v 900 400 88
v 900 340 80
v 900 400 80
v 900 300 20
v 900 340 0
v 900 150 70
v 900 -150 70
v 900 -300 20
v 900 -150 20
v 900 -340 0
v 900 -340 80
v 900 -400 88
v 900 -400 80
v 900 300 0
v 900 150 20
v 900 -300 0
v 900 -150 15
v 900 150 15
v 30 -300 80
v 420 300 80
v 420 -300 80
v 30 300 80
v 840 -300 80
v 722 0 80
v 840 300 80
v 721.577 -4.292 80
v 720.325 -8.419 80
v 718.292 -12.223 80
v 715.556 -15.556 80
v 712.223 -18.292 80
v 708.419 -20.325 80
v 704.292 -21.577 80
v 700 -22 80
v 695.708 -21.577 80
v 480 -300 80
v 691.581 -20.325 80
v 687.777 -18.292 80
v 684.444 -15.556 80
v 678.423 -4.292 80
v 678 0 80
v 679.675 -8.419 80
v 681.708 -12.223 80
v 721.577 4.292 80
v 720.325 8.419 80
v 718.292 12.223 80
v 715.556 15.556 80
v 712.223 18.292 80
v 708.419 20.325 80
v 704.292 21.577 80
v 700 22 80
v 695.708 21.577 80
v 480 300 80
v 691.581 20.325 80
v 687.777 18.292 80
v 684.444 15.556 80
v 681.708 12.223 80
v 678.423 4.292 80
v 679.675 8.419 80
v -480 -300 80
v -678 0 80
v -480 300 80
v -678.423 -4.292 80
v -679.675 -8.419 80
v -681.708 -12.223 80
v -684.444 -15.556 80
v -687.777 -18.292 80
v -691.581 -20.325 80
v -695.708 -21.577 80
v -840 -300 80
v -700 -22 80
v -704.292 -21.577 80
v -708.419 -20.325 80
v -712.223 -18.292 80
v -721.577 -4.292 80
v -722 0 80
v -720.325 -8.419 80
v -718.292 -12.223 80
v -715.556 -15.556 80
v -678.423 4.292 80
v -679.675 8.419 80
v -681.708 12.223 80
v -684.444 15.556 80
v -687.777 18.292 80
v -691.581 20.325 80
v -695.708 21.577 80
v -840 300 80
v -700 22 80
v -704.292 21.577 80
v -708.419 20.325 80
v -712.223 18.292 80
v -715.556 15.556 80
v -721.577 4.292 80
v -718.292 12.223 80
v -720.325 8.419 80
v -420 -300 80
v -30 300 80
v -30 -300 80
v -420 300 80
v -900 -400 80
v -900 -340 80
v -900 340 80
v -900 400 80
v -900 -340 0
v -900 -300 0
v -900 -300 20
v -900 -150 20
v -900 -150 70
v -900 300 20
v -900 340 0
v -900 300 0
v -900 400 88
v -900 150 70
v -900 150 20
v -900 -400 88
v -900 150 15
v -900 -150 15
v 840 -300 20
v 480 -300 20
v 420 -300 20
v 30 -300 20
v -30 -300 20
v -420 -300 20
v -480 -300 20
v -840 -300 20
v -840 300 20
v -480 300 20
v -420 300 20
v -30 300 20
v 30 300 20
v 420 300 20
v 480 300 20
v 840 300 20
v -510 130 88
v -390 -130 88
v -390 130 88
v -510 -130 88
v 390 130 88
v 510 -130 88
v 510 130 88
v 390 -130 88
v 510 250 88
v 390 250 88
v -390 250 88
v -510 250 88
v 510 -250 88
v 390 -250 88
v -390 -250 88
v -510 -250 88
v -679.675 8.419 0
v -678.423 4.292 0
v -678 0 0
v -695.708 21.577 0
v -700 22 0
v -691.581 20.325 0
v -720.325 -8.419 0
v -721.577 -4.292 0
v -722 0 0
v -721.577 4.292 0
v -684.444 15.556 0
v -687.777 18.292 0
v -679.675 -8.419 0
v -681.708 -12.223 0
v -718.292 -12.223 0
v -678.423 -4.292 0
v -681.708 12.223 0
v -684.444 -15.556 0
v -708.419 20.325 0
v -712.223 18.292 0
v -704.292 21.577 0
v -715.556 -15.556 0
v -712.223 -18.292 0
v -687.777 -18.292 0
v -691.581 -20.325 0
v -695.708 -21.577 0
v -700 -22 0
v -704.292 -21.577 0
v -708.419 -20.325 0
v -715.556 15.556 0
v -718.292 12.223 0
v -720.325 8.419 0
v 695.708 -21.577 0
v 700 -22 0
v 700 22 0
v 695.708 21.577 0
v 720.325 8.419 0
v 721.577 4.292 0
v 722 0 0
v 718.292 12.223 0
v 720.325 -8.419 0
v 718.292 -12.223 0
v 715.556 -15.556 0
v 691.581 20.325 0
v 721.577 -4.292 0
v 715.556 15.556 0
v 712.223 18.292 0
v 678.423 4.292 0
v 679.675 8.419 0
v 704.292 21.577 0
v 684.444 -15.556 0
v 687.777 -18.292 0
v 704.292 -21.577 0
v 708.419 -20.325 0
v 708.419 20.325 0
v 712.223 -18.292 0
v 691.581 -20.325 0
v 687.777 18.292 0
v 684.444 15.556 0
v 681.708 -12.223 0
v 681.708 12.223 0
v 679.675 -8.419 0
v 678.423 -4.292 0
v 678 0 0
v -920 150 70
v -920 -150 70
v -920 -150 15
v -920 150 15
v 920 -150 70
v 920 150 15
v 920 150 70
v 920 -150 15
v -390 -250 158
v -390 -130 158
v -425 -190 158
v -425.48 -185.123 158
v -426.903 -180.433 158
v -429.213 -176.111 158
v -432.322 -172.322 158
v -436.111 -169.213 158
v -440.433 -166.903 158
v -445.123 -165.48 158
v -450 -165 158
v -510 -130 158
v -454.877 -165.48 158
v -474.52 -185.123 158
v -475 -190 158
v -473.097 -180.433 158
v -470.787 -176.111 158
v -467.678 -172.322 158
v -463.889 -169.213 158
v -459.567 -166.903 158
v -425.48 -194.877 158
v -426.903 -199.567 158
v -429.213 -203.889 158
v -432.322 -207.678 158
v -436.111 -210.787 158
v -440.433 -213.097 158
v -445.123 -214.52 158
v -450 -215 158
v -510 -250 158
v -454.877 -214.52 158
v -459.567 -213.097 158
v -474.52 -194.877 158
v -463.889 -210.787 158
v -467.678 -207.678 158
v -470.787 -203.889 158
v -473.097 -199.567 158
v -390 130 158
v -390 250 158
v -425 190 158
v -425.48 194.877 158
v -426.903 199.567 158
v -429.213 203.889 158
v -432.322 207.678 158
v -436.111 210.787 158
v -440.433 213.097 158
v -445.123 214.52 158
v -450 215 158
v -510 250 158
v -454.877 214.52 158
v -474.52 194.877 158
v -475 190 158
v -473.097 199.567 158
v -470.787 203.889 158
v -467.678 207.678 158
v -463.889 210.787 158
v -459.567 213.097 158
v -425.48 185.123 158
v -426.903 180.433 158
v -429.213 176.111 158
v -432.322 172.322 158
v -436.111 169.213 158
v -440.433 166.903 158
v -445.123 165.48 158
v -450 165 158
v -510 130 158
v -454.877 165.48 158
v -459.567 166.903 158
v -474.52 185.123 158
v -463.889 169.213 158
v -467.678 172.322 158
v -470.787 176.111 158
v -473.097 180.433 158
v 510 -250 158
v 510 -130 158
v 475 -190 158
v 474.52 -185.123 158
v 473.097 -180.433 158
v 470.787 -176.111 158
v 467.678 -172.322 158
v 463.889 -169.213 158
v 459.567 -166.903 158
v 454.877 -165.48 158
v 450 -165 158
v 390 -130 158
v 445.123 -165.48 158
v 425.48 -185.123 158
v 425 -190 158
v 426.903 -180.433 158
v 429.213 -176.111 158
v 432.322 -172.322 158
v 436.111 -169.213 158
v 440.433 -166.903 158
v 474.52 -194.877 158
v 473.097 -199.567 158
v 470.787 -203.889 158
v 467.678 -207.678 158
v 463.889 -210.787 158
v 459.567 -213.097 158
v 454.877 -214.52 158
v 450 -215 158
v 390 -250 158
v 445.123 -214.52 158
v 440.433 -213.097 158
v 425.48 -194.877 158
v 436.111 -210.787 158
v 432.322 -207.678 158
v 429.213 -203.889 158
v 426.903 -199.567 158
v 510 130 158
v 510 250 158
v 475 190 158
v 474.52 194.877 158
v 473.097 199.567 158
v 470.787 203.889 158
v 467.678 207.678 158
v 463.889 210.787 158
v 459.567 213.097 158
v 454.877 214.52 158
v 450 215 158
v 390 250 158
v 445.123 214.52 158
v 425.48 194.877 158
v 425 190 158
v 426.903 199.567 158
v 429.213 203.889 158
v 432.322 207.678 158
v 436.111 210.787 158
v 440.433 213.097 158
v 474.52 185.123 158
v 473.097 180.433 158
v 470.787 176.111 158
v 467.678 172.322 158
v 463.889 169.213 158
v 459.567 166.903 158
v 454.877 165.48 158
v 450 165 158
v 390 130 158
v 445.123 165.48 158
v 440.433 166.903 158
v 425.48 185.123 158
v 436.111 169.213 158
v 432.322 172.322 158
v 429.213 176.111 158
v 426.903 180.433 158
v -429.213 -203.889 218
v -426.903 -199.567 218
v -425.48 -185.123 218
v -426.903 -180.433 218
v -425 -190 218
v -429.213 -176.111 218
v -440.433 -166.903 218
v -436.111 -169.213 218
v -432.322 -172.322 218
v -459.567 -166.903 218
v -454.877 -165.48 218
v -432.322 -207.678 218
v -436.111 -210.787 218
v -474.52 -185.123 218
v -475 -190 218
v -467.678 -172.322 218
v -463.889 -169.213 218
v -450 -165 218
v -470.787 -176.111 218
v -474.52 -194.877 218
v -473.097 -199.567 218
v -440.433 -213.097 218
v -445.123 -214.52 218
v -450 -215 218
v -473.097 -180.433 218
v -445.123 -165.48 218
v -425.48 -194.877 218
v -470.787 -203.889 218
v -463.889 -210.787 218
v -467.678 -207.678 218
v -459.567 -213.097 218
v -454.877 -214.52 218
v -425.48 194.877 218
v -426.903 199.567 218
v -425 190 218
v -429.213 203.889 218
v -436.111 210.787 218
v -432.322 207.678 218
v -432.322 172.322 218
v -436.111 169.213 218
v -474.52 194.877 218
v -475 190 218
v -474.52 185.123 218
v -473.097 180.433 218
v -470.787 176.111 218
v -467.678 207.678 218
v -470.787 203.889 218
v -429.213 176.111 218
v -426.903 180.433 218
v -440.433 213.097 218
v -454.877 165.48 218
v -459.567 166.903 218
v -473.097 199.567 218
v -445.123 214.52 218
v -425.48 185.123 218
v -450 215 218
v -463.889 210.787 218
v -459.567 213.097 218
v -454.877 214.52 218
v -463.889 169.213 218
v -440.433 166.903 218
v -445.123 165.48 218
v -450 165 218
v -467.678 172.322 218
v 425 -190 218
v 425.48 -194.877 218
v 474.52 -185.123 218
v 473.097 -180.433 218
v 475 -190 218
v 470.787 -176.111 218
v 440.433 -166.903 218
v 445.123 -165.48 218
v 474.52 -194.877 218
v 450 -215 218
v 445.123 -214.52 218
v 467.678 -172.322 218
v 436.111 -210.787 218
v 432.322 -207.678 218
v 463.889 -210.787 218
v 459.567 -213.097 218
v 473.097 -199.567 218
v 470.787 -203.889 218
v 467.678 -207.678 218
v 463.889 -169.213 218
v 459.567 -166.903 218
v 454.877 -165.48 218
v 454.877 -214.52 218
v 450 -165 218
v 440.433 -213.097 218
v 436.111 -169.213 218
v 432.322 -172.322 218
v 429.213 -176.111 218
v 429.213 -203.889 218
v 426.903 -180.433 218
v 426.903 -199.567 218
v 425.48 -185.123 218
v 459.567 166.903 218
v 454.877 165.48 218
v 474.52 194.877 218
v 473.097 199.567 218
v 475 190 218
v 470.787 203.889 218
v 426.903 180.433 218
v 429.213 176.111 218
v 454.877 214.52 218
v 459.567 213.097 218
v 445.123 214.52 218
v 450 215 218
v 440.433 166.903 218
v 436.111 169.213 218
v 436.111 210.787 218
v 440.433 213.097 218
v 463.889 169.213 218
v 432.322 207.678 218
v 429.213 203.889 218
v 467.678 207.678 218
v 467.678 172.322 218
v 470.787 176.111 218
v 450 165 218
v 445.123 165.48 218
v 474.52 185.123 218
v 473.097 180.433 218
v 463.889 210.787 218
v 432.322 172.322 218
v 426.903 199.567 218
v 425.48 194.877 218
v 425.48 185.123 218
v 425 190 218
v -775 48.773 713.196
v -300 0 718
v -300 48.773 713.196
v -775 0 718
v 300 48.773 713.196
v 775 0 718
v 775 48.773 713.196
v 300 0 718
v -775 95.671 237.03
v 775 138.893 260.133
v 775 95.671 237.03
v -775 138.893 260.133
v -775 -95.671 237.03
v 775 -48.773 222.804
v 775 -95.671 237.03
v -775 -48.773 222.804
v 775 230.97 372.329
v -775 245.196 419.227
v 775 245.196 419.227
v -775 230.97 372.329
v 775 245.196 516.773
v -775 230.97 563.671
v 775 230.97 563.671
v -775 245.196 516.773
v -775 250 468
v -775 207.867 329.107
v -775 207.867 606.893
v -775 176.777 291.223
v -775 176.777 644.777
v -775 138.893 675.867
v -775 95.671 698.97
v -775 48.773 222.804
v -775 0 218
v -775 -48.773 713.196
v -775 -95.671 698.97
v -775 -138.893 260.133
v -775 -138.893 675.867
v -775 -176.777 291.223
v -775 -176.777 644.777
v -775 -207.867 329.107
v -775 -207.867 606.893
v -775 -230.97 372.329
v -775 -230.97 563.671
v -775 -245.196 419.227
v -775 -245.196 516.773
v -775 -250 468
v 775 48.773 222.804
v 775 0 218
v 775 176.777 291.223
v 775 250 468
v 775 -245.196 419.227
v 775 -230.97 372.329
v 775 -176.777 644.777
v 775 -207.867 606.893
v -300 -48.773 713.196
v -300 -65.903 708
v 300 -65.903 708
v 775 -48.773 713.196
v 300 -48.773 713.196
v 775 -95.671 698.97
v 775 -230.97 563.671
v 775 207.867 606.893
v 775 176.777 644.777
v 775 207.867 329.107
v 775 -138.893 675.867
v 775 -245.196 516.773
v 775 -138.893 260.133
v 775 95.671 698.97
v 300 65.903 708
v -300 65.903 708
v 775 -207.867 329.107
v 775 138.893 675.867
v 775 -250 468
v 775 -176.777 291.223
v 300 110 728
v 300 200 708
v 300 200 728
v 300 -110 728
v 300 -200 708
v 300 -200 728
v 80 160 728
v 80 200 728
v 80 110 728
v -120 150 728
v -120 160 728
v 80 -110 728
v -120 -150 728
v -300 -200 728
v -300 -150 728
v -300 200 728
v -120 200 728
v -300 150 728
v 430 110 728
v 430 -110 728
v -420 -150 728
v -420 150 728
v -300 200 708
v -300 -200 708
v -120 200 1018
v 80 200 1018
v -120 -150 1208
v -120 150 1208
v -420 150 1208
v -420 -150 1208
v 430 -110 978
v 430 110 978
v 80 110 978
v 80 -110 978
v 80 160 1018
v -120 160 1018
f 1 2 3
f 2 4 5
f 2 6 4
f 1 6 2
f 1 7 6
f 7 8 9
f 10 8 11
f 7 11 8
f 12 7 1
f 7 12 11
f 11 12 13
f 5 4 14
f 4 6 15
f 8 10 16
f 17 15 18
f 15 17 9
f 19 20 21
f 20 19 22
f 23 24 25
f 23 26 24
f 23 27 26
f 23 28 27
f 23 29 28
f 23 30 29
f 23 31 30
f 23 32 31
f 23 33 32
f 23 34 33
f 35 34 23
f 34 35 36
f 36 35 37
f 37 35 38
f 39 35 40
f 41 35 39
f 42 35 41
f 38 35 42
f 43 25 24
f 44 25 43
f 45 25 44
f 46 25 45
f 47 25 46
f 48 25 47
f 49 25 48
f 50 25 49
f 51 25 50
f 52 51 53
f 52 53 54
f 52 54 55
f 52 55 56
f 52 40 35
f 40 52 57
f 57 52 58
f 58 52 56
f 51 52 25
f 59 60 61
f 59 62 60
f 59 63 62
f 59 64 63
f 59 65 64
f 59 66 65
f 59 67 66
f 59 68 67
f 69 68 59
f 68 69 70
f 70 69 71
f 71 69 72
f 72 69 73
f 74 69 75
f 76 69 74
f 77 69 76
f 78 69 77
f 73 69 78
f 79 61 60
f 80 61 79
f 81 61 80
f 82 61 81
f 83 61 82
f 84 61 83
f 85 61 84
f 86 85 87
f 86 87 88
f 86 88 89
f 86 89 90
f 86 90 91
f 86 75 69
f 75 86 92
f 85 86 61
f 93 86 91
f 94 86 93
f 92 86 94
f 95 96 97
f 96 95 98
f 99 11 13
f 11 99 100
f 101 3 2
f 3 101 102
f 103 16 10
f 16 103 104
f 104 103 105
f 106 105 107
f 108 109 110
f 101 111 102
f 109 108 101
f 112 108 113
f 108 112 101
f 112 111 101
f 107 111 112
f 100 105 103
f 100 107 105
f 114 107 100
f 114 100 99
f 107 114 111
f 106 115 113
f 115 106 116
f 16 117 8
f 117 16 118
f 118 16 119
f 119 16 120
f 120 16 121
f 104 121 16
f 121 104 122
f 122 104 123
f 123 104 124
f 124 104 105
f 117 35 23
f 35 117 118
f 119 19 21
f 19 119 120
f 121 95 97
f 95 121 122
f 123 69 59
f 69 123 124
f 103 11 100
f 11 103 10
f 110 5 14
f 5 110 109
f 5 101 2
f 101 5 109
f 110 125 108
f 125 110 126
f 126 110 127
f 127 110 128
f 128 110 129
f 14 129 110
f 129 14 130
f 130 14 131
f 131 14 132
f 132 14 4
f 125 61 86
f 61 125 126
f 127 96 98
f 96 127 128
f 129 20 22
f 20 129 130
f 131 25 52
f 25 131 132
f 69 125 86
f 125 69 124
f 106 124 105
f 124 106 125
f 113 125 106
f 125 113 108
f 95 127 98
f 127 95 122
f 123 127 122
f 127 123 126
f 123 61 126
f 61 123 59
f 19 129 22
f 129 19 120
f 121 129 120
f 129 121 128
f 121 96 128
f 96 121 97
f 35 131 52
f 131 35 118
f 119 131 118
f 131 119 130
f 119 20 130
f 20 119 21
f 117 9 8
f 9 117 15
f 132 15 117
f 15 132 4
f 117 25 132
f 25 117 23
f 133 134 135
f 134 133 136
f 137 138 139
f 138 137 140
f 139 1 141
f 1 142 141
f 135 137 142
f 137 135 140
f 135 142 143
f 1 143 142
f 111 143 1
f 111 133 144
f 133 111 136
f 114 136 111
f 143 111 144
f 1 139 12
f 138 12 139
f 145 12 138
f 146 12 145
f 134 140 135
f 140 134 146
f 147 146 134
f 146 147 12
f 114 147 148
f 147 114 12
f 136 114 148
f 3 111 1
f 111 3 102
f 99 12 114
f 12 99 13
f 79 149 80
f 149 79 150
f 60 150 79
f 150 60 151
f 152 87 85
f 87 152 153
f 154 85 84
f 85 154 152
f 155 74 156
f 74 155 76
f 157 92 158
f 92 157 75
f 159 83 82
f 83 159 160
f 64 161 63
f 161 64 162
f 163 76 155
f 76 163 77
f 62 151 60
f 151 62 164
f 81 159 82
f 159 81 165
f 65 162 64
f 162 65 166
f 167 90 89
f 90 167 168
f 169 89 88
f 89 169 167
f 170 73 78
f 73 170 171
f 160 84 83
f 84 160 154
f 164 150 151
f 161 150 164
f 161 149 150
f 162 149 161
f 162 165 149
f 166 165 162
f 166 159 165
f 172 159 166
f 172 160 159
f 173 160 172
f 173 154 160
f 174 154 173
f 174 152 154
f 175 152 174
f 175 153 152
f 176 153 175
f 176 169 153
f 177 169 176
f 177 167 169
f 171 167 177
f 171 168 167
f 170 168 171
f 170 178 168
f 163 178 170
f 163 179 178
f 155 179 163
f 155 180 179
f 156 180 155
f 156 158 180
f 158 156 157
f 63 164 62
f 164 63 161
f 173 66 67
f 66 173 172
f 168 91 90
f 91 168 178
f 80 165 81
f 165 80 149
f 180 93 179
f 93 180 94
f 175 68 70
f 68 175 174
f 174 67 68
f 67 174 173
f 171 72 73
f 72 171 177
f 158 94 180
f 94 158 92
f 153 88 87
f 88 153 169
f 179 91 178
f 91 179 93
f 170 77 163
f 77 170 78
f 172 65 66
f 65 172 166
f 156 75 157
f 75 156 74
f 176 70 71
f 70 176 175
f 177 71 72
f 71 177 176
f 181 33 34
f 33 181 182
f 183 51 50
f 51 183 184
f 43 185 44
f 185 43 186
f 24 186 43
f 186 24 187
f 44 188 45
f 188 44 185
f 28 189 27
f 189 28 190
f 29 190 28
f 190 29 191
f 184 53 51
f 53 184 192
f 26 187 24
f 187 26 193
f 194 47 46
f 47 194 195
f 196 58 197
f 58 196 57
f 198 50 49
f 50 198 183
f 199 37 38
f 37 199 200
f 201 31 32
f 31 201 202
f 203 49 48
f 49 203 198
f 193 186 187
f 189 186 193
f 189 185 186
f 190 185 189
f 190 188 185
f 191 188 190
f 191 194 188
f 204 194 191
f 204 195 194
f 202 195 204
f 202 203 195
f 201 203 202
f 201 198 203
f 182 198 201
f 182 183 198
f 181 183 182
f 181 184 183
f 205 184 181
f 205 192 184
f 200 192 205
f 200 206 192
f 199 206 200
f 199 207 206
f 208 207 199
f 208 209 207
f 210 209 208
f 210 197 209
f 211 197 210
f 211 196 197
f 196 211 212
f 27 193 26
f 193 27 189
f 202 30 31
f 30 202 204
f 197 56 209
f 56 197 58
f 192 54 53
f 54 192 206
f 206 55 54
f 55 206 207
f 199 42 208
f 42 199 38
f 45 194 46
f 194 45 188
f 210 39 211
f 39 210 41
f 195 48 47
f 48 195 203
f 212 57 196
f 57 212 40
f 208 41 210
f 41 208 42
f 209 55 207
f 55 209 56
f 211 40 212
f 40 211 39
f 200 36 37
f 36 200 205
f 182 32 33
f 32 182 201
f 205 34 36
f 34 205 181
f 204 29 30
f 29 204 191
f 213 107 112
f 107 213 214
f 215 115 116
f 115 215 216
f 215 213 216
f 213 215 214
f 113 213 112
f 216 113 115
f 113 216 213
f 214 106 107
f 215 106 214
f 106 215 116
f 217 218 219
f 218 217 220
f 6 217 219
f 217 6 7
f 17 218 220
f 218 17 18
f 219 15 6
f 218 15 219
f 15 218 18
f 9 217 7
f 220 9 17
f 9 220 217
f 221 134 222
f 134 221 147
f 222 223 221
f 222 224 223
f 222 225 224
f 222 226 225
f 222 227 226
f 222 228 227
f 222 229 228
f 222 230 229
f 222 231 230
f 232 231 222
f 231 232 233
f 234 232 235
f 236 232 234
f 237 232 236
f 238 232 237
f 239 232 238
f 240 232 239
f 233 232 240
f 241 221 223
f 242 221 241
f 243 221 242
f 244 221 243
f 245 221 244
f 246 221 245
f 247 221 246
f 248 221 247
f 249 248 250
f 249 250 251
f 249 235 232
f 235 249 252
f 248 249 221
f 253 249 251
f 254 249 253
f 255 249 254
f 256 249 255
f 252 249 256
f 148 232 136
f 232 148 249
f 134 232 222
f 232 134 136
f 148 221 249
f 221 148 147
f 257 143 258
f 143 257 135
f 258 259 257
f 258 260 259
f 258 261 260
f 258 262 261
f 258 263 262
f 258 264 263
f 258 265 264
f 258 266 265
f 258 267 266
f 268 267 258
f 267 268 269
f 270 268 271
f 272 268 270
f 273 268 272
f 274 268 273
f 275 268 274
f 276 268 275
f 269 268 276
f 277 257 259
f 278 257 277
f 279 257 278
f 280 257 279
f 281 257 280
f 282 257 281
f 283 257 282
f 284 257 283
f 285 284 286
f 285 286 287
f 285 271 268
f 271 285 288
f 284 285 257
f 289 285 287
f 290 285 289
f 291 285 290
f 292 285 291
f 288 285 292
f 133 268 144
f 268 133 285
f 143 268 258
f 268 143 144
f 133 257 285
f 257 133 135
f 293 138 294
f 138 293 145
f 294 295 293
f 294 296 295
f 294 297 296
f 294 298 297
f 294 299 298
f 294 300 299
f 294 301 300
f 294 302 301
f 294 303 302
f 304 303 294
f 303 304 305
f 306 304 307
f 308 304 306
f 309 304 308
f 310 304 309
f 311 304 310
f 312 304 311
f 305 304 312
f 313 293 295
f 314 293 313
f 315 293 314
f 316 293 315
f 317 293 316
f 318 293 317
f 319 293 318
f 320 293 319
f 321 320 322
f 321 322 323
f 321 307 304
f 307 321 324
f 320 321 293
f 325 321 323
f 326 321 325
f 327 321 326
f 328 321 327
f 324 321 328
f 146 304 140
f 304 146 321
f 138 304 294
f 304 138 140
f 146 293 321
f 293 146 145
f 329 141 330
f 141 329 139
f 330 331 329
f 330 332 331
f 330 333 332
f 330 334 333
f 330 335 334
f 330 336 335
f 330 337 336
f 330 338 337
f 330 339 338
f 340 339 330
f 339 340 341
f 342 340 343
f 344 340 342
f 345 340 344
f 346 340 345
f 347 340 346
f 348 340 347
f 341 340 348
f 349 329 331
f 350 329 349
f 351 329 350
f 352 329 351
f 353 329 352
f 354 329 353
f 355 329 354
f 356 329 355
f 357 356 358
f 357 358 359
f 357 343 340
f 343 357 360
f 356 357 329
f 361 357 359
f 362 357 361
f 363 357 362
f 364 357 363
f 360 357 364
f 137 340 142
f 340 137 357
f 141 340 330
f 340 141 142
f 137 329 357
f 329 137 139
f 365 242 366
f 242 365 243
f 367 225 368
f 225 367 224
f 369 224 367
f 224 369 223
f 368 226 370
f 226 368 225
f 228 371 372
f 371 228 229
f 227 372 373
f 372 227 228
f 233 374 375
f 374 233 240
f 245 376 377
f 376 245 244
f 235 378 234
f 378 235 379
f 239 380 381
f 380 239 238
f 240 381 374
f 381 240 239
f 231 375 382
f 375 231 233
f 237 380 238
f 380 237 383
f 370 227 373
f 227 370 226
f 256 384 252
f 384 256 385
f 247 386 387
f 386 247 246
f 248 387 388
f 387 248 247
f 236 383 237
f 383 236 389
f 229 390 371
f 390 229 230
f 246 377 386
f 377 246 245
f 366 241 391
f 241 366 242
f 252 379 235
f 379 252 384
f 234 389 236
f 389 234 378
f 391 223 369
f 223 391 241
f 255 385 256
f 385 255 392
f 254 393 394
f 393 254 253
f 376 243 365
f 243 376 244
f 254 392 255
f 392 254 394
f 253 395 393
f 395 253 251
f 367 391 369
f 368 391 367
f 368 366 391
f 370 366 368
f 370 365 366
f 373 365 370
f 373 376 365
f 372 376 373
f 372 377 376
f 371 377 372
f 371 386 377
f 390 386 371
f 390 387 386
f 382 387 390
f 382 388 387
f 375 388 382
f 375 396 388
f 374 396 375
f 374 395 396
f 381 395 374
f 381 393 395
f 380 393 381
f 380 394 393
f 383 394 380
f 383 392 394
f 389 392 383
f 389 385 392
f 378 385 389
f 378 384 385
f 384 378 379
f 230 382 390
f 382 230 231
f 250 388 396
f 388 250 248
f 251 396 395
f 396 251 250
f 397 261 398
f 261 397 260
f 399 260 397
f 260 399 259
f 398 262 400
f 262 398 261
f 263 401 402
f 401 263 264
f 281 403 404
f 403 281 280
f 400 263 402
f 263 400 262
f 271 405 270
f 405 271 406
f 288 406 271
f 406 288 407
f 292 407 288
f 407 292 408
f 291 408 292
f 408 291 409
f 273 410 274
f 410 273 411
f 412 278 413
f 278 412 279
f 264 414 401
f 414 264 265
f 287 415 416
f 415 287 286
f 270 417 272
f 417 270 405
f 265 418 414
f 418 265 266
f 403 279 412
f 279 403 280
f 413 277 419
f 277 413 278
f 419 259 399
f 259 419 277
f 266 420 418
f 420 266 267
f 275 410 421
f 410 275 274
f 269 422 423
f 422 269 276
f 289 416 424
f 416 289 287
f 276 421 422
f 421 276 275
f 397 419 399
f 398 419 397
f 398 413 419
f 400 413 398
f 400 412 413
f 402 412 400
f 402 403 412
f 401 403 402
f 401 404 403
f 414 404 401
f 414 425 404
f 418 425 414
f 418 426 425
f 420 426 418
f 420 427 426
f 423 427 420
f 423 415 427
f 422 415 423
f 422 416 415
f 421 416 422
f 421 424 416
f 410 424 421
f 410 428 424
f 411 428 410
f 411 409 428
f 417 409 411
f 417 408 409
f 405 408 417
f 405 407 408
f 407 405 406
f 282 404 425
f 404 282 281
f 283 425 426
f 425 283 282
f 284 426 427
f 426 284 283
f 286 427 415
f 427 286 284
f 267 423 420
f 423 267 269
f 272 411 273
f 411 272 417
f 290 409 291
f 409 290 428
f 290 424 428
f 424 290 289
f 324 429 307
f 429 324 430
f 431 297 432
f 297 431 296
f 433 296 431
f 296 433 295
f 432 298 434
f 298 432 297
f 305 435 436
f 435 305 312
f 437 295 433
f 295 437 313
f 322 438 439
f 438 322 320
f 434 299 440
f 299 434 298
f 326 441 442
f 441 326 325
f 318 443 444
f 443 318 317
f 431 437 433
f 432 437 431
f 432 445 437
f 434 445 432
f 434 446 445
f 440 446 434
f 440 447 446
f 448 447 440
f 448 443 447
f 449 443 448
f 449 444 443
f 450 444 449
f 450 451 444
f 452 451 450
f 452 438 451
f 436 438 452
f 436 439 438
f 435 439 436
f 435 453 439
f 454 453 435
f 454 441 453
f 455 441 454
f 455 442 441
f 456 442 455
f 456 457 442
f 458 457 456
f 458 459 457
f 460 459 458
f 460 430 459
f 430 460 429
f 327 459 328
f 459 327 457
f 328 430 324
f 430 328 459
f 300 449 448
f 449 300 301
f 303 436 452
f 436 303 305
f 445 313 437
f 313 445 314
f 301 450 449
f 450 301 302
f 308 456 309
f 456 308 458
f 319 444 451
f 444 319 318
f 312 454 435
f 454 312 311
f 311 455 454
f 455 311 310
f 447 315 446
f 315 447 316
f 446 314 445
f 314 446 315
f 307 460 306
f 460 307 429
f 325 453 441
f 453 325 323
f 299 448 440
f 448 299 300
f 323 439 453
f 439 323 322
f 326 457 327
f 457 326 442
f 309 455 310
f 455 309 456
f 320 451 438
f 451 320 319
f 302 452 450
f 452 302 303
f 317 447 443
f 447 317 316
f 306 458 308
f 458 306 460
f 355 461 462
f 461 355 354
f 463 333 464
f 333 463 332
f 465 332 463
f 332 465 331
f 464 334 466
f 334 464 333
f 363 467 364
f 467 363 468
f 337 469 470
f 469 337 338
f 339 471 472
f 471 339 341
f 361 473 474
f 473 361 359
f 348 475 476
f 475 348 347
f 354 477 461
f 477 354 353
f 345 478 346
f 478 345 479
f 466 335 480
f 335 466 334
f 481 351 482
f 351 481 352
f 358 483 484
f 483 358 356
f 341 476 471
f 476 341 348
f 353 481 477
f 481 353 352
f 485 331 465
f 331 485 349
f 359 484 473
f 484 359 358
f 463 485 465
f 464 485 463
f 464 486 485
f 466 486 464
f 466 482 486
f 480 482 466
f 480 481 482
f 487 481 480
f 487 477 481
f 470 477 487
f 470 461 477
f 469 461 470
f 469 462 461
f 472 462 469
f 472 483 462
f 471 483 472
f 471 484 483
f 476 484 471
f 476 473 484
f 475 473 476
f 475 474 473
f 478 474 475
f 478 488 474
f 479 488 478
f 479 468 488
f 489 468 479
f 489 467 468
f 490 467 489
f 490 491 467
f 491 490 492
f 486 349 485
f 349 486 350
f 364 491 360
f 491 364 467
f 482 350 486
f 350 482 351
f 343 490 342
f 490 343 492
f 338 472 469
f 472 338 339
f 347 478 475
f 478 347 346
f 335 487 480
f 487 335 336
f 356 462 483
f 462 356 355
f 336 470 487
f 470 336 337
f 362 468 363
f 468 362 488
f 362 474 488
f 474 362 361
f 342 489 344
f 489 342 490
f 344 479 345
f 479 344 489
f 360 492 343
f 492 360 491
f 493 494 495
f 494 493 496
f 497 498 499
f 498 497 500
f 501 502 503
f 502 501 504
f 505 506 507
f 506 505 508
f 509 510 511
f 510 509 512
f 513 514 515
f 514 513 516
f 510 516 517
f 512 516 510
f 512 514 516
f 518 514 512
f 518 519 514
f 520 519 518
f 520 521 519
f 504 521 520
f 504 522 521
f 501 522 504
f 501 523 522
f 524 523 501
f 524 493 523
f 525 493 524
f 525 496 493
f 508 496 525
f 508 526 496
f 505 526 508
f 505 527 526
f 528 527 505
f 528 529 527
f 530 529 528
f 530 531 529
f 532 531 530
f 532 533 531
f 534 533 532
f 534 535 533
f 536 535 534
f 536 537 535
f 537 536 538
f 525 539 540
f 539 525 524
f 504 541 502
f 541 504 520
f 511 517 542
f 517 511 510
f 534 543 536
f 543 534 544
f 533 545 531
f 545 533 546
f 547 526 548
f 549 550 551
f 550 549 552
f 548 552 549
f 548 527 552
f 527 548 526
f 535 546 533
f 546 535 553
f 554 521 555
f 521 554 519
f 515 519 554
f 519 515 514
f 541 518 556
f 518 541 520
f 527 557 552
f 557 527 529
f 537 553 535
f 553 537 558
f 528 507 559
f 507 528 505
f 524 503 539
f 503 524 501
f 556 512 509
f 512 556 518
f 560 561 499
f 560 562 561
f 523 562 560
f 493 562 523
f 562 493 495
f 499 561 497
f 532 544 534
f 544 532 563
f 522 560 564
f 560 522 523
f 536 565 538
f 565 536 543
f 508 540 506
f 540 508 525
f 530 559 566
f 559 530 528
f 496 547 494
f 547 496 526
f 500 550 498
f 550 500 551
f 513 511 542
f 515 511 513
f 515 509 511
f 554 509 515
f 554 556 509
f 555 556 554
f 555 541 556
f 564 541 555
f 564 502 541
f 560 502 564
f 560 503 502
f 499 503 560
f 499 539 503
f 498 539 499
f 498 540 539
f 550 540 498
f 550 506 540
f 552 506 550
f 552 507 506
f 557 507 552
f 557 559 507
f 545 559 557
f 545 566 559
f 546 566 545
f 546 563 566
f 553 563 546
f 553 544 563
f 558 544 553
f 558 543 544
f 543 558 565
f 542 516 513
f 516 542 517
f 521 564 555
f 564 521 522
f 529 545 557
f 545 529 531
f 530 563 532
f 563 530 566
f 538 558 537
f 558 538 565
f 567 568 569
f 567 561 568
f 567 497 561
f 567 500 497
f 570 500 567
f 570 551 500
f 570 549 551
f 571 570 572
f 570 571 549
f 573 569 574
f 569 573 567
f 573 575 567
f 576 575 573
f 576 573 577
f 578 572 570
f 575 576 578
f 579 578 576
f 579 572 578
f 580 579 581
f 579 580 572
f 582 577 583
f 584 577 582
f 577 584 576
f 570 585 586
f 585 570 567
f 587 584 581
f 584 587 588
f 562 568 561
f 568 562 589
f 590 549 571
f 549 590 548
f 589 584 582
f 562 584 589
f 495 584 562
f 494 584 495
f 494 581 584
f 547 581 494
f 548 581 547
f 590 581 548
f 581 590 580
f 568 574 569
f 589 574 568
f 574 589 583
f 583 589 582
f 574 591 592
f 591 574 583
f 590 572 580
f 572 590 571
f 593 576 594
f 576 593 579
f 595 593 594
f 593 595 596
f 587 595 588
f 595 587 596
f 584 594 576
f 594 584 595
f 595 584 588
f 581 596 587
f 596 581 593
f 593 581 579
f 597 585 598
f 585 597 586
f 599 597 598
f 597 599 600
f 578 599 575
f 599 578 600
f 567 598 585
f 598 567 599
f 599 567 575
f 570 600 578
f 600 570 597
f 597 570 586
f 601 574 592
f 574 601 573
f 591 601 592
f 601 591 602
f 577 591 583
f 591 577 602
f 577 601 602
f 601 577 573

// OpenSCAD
// carrier_vc20 - generated by asm_3d.py from out/assembly/assembly_specs.json (F4.4) - units mm
// DESIGN - check and release before manufacture. z up, conveyor top z = 500.

module carrier_vc20() {
  translate([-900.00, -340.00, 0.00]) cube([1800.00, 40.00, 80.00]);
  translate([-900.00, 300.00, 0.00]) cube([1800.00, 40.00, 80.00]);
  translate([-900.00, -300.00, 20.00]) cube([60.00, 600.00, 60.00]);
  translate([-480.00, -300.00, 20.00]) cube([60.00, 600.00, 60.00]);
  translate([-30.00, -300.00, 20.00]) cube([60.00, 600.00, 60.00]);
  translate([420.00, -300.00, 20.00]) cube([60.00, 600.00, 60.00]);
  translate([840.00, -300.00, 20.00]) cube([60.00, 600.00, 60.00]);
  translate([-900.00, -400.00, 80.00]) cube([1800.00, 800.00, 8.00]);
  translate([-700.00, 0.00, 40.00]) rotate([0, 0, 0]) cylinder(r = 22.00, h = 80.00, center = true, $fn = 32);
  translate([700.00, 0.00, 40.00]) rotate([0, 0, 0]) cylinder(r = 22.00, h = 80.00, center = true, $fn = 32);
  translate([-920.00, -150.00, 15.00]) cube([20.00, 300.00, 55.00]);
  translate([900.00, -150.00, 15.00]) cube([20.00, 300.00, 55.00]);
  translate([-510.00, -250.00, 88.00]) cube([120.00, 120.00, 70.00]);
  translate([-510.00, 130.00, 88.00]) cube([120.00, 120.00, 70.00]);
  translate([390.00, -250.00, 88.00]) cube([120.00, 120.00, 70.00]);
  translate([390.00, 130.00, 88.00]) cube([120.00, 120.00, 70.00]);
  translate([-450.00, -190.00, 188.00]) rotate([0, 0, 0]) cylinder(r = 25.00, h = 60.00, center = true, $fn = 32);
  translate([-450.00, 190.00, 188.00]) rotate([0, 0, 0]) cylinder(r = 25.00, h = 60.00, center = true, $fn = 32);
  translate([450.00, -190.00, 188.00]) rotate([0, 0, 0]) cylinder(r = 25.00, h = 60.00, center = true, $fn = 32);
  translate([450.00, 190.00, 188.00]) rotate([0, 0, 0]) cylinder(r = 25.00, h = 60.00, center = true, $fn = 32);
  translate([0.00, 0.00, 468.00]) rotate([0, 90, 0]) cylinder(r = 250.00, h = 1550.00, center = true, $fn = 32);
  translate([-300.00, -200.00, 708.00]) cube([600.00, 400.00, 20.00]);
  translate([-420.00, -150.00, 728.00]) cube([300.00, 300.00, 480.00]);
  translate([80.00, -110.00, 728.00]) cube([350.00, 220.00, 250.00]);
  translate([-120.00, 160.00, 728.00]) cube([200.00, 40.00, 290.00]);
}
carrier_vc20();
